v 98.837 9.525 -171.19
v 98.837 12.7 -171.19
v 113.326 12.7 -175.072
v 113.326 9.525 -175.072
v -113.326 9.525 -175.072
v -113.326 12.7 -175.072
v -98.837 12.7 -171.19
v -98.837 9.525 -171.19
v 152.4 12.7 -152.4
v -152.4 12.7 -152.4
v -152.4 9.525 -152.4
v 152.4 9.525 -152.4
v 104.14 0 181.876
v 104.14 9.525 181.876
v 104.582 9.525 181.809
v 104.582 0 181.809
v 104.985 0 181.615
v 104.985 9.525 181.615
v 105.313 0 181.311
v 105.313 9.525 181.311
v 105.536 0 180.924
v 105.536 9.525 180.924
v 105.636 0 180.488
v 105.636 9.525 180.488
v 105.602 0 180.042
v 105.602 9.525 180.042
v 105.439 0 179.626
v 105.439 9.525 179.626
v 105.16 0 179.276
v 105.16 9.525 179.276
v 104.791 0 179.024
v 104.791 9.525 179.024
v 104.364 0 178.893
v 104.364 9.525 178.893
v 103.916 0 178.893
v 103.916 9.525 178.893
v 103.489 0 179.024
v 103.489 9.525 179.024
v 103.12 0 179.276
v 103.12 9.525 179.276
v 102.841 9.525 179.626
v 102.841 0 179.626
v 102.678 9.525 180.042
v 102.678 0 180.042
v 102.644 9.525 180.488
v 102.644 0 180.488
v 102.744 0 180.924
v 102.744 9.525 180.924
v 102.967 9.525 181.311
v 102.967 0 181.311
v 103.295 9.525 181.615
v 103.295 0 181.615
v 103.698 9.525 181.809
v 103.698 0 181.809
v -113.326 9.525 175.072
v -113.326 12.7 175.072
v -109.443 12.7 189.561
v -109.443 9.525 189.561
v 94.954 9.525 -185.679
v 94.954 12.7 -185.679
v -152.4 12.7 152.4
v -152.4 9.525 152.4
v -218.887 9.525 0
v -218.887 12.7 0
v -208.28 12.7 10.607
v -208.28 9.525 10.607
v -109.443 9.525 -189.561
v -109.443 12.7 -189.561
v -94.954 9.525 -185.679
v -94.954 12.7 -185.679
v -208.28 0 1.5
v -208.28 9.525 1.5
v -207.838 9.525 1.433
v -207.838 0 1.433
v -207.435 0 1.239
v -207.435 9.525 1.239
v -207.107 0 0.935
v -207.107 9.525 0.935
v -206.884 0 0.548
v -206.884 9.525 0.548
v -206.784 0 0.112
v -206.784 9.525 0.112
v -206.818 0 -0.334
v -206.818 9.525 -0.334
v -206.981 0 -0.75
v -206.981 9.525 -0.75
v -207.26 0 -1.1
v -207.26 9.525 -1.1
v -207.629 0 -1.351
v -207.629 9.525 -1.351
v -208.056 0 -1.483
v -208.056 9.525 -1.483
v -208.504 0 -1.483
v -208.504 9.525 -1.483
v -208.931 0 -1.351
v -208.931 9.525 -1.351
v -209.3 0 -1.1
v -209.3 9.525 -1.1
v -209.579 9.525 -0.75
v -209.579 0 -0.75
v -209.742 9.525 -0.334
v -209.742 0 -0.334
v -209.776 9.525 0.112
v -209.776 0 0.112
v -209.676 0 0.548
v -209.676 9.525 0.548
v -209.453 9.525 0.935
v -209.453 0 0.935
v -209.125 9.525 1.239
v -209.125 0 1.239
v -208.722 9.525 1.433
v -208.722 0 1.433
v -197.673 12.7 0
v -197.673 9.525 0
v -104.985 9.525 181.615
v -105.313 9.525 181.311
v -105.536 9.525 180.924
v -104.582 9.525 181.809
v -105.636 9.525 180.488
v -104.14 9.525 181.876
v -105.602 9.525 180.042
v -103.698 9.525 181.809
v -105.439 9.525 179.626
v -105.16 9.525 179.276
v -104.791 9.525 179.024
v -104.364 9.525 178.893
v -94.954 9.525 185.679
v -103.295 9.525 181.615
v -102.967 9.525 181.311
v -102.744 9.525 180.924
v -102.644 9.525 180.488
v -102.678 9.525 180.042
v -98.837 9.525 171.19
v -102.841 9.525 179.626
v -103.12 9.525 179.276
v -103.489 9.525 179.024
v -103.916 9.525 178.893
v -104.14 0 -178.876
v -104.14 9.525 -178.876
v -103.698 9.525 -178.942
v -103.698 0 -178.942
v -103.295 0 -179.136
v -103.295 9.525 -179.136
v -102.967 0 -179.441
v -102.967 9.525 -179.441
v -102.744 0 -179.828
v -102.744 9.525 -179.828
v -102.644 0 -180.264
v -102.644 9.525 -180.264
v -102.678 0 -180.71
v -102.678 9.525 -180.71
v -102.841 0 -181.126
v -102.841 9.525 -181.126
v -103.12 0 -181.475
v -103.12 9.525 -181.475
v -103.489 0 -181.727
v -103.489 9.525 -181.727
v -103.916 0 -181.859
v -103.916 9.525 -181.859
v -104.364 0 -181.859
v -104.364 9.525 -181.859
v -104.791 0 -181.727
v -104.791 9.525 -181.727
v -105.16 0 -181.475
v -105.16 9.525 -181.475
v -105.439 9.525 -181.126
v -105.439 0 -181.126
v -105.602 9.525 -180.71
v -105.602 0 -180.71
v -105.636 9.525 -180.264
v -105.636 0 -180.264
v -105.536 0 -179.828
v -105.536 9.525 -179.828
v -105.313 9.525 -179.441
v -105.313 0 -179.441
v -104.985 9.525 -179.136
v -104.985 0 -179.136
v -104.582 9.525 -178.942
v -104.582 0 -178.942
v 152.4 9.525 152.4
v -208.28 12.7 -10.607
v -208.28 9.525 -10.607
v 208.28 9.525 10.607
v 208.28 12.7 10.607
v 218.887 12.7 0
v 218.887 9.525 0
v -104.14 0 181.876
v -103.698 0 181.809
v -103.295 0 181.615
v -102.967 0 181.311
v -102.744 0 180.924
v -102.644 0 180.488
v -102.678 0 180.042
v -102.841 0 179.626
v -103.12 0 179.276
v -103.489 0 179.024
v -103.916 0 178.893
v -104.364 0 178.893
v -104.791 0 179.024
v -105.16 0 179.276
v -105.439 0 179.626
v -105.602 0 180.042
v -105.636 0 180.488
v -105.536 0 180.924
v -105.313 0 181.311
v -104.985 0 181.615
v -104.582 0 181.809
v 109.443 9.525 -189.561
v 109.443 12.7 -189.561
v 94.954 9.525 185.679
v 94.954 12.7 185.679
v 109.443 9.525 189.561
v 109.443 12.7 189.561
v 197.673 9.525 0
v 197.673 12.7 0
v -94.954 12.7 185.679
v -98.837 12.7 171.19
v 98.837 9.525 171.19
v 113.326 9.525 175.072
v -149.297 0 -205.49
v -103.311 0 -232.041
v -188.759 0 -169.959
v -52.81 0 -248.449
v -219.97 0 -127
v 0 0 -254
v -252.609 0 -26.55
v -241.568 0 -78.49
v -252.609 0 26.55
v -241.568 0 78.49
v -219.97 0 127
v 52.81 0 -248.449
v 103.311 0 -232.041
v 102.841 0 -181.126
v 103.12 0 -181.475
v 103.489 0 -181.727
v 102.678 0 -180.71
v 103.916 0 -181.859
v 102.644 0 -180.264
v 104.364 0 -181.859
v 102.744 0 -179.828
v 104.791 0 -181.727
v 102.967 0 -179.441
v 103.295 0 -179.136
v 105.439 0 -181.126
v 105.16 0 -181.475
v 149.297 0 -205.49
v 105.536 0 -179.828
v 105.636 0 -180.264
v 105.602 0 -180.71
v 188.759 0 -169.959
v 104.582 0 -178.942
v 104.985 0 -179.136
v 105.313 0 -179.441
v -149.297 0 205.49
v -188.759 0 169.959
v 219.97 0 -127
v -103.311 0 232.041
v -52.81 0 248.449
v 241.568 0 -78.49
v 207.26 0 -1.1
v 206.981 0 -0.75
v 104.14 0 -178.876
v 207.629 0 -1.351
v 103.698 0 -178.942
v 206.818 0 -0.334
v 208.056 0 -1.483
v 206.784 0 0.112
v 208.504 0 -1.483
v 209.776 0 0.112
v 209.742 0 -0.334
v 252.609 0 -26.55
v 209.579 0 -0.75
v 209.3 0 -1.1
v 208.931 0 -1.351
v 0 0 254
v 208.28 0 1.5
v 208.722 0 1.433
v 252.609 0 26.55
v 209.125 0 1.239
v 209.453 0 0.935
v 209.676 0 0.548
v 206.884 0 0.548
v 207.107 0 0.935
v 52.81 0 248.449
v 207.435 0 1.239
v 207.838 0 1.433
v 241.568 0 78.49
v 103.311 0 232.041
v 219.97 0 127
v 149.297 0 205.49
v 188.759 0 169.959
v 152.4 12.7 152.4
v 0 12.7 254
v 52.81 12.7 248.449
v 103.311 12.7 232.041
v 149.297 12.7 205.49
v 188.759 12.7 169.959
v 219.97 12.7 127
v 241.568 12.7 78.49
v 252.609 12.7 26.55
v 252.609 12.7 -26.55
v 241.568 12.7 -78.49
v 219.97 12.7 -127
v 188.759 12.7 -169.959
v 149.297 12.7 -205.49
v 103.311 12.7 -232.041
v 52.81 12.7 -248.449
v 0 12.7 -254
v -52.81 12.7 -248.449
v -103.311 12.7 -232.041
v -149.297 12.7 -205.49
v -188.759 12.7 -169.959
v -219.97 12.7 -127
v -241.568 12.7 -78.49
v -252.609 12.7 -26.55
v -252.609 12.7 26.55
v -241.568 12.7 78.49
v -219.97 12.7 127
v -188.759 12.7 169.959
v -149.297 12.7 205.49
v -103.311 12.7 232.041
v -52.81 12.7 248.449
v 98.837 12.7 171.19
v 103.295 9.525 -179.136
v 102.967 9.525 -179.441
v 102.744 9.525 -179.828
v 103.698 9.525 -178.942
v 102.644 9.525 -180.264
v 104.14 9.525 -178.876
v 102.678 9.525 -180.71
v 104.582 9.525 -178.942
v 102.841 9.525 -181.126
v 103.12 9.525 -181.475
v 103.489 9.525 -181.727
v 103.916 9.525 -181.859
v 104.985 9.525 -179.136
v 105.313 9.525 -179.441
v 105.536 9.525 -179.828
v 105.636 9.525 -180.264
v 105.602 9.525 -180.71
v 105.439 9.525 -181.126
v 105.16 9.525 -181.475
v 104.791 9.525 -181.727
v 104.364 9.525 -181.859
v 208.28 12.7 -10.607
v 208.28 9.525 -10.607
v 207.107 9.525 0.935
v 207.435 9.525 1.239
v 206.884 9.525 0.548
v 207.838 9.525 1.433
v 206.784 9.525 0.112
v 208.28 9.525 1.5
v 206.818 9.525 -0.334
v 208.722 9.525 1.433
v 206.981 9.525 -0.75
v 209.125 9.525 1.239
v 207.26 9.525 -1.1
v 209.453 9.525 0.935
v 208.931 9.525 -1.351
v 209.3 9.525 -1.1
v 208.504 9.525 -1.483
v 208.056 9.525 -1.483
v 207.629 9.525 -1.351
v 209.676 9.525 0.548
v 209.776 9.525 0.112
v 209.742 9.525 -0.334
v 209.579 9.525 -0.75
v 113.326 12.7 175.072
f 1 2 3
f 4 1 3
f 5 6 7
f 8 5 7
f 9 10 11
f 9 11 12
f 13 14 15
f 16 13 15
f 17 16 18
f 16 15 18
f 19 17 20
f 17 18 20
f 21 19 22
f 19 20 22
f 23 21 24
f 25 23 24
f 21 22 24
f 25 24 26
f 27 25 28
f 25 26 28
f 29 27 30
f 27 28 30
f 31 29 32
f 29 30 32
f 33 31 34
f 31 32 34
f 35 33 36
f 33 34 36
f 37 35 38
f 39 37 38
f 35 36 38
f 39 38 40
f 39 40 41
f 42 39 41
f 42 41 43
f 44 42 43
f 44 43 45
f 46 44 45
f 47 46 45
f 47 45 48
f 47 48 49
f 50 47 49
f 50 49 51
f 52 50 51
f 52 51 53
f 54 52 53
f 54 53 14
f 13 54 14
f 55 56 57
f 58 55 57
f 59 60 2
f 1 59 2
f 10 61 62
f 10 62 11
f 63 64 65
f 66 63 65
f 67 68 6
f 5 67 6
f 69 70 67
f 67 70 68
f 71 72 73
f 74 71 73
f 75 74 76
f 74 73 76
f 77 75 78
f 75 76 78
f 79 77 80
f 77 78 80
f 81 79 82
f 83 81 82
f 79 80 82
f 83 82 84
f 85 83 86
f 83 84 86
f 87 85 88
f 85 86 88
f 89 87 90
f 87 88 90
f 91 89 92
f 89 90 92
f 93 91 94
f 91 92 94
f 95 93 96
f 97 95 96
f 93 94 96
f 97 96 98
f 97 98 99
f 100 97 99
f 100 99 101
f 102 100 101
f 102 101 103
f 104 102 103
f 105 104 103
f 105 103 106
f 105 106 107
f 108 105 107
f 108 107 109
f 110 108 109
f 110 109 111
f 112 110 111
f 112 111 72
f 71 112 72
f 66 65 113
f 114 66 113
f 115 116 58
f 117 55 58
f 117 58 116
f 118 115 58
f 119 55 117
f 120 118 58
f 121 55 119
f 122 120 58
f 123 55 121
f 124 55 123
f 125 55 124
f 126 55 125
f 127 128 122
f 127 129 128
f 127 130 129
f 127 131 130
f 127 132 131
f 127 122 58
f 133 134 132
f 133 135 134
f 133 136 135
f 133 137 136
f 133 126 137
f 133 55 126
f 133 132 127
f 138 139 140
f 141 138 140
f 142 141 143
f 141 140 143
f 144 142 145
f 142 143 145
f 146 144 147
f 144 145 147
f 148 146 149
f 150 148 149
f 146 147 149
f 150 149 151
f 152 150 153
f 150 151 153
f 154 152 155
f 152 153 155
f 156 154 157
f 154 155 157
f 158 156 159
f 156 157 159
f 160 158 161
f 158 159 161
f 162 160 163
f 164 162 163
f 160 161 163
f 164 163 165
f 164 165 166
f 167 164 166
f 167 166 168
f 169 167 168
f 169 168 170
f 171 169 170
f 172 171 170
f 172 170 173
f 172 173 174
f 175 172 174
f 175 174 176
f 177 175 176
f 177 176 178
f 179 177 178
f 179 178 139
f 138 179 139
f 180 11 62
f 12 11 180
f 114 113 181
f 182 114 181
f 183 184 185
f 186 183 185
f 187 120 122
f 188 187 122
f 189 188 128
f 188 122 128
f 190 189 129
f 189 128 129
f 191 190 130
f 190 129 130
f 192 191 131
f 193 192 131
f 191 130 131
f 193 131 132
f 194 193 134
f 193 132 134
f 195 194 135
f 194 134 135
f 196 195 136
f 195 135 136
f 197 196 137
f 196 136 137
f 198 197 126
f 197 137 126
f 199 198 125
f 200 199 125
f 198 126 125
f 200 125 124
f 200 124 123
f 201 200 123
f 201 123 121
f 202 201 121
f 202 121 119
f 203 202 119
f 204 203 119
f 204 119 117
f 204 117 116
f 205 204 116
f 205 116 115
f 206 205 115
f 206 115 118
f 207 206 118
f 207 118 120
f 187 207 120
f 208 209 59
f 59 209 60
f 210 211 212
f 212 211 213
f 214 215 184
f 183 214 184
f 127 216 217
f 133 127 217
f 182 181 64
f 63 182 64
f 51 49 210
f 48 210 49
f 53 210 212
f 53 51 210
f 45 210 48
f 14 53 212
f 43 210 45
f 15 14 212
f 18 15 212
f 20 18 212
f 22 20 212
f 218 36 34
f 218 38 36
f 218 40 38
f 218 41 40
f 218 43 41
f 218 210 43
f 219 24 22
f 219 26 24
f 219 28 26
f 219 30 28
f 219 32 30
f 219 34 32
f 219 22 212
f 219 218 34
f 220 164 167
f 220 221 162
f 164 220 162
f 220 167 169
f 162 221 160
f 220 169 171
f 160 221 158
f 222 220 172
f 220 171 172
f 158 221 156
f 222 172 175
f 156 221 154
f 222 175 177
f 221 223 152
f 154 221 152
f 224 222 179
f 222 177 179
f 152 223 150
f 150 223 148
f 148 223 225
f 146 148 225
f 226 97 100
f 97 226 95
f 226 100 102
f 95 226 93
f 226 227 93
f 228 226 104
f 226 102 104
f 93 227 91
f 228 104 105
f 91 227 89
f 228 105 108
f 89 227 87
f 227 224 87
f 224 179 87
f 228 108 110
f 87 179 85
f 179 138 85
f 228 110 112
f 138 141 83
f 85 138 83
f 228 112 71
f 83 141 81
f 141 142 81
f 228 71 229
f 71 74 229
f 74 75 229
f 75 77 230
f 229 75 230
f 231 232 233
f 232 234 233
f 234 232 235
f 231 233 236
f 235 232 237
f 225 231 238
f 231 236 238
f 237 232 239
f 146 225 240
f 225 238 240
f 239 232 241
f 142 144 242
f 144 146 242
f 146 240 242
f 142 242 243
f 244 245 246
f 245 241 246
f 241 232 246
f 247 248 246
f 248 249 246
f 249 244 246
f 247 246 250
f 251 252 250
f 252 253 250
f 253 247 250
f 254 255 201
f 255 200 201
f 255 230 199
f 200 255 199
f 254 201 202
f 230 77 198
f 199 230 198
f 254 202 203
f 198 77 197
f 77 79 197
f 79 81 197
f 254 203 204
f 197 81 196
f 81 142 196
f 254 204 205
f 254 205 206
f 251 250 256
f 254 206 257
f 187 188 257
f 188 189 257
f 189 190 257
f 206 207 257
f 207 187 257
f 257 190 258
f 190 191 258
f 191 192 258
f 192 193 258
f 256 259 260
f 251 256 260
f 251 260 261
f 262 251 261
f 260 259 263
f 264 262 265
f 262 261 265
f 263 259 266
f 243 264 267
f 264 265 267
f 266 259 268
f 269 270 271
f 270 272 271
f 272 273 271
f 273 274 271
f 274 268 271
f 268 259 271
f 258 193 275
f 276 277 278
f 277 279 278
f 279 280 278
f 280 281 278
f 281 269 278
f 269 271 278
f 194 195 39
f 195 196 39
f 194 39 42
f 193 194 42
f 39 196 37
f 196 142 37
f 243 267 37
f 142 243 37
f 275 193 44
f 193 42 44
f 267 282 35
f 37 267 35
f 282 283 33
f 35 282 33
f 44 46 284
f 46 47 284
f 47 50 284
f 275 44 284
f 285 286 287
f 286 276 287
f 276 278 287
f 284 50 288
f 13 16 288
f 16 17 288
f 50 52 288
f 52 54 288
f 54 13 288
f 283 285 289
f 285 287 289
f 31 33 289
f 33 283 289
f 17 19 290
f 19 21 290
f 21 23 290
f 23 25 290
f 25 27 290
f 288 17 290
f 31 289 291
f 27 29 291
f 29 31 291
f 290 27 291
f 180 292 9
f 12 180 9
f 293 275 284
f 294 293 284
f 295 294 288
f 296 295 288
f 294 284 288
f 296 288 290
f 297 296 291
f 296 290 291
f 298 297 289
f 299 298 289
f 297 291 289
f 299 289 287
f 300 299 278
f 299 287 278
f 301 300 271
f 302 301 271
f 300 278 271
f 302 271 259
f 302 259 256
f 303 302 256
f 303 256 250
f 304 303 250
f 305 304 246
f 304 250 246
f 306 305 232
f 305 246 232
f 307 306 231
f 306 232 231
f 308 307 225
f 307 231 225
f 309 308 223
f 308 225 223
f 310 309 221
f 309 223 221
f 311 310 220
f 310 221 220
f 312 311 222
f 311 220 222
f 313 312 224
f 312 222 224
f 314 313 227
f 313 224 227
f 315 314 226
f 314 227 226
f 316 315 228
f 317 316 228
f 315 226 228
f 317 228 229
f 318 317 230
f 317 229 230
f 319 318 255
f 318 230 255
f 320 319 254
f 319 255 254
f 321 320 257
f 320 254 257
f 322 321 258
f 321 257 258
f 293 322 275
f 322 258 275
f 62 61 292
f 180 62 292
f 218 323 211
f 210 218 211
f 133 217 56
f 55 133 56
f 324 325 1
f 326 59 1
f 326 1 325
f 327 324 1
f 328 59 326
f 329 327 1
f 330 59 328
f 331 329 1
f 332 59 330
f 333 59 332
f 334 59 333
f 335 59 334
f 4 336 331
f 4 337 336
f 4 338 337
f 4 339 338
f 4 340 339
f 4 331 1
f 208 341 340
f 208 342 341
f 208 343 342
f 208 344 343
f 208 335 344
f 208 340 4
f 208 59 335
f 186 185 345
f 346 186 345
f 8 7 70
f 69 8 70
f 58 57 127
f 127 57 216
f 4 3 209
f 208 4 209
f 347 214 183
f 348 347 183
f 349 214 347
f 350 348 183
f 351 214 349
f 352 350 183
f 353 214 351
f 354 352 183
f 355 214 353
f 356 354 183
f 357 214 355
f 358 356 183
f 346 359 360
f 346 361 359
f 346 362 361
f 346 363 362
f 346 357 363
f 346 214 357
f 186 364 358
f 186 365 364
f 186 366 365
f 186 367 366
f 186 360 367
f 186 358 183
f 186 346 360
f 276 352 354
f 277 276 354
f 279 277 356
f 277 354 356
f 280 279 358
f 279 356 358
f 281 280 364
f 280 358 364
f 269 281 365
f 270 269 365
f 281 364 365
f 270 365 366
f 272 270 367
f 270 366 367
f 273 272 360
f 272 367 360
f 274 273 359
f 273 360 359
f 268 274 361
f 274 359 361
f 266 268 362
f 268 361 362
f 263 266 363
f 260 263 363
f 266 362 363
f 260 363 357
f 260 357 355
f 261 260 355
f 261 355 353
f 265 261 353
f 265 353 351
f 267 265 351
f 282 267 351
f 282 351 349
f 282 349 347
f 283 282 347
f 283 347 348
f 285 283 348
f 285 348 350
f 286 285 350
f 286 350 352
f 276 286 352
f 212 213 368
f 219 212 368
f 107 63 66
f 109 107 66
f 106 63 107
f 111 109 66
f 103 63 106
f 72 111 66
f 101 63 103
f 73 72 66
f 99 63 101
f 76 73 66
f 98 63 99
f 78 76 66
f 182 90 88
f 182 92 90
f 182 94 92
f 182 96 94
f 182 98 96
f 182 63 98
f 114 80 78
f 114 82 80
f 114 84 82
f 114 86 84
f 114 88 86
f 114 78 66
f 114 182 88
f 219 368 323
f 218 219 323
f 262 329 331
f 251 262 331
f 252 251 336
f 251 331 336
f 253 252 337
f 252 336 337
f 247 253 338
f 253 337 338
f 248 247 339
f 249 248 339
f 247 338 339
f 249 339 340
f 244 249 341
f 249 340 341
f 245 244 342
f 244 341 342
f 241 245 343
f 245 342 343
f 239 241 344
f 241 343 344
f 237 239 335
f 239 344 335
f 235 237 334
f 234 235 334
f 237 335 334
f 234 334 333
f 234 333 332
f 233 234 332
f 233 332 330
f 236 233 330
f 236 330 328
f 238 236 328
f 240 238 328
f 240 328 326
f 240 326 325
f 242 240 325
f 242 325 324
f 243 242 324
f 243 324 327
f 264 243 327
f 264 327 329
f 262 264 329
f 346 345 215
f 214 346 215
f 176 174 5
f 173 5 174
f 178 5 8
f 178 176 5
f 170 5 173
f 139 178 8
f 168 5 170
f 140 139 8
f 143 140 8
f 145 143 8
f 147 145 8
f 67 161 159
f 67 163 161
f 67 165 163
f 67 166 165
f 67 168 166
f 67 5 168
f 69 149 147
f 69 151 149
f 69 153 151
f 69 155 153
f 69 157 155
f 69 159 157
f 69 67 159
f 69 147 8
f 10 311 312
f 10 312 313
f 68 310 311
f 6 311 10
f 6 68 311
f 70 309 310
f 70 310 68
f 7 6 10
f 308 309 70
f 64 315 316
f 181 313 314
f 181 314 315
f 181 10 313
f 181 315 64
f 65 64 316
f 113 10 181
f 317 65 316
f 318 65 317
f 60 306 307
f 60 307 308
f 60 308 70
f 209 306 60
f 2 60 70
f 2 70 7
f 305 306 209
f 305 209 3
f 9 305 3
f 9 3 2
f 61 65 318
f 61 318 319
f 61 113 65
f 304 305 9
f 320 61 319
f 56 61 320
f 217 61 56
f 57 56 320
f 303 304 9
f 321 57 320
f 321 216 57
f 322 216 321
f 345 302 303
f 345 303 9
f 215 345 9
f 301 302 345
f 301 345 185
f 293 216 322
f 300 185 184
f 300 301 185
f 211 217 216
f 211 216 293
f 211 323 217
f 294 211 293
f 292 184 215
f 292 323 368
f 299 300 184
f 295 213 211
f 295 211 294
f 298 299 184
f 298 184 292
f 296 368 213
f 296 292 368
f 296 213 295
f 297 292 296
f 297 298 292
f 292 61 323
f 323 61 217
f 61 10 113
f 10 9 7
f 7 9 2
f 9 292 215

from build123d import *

# Parameters (mm, degrees)
SKETCH1_R           = 254
BOSS_EXTRUDE1_DEPTH = 12.7
SKETCH2_W           = 304.8
SKETCH2_H           = 304.8
CUT_EXTRUDE1_DEPTH  = 3.175
CUT_EXTRUDE2_DEPTH  = 3.175
SKETCH4_R           = 1.5
CUT_EXTRUDE3_DEPTH  = 360.434681131


with BuildPart() as part:
    # Sketch1 → Boss-Extrude1 (new body)
    with BuildSketch(Plane(origin=(0, 0, 0), x_dir=(1, 0, 0), z_dir=(0, 1, 0))):
        with Locations(Location((0, 0, 0), (0, 0, 270))):
            Circle(SKETCH1_R)
    extrude(amount=BOSS_EXTRUDE1_DEPTH)

    # Sketch2 → Cut-Extrude1 (cut)
    with BuildSketch(Plane(origin=(0, 12.7, 0), x_dir=(1, 0, 0), z_dir=(0, 1, 0))):
        Rectangle(SKETCH2_W, SKETCH2_H)
    extrude(amount=-CUT_EXTRUDE1_DEPTH, mode=Mode.SUBTRACT)

    # Sketch3 → Cut-Extrude2 (cut)
    with BuildSketch(Plane(origin=(0, 12.7, 0), x_dir=(1, 0, 0), z_dir=(0, 1, 0))):
        Polygon((94.954413465, 185.679071959), (98.836699141, 171.190184565), (113.325586535, 175.072470241), (109.443300859, 189.561357636), align=None)
        Polygon((218.886601718, 0), (208.28, 10.606601718), (197.673398282, 0), (208.28, -10.606601718), align=None)
        Polygon((109.443300859, -189.561357636), (113.325586535, -175.072470241), (98.836699141, -171.190184565), (94.954413465, -185.679071959), align=None)
        Polygon((-109.443300859, -189.561357636), (-94.954413465, -185.679071959), (-98.836699141, -171.190184565), (-113.325586535, -175.072470241), align=None)
        Polygon((-218.886601718, 0), (-208.28, -10.606601718), (-197.673398282, 0), (-208.28, 10.606601718), align=None)
        Polygon((-109.443300859, 189.561357636), (-113.325586535, 175.072470241), (-98.836699141, 171.190184565), (-94.954413465, 185.679071959), align=None)
    extrude(amount=-CUT_EXTRUDE2_DEPTH, mode=Mode.SUBTRACT)

    # Sketch4 → Cut-Extrude3 (cut, through all)
    with BuildSketch(Plane(origin=(0, 12.7, 0), x_dir=(1, 0, 0), z_dir=(0, 1, 0))):
        with Locations(Location((104.14, 180.3757711, 0), (0, 0, 270))):
            Circle(SKETCH4_R)
        with Locations(Location((208.28, 0, 0), (0, 0, 270))):
            Circle(SKETCH4_R)
        with Locations(Location((104.14, -180.3757711, 0), (0, 0, 270))):
            Circle(SKETCH4_R)
        with Locations(Location((-104.14, -180.3757711, 0), (0, 0, 270))):
            Circle(SKETCH4_R)
        with Locations(Location((-208.28, 0, 0), (0, 0, 270))):
            Circle(SKETCH4_R)
        with Locations(Location((-104.14, 180.3757711, 0), (0, 0, 270))):
            Circle(SKETCH4_R)
    extrude(amount=-CUT_EXTRUDE3_DEPTH, mode=Mode.SUBTRACT)


solid = part.part
